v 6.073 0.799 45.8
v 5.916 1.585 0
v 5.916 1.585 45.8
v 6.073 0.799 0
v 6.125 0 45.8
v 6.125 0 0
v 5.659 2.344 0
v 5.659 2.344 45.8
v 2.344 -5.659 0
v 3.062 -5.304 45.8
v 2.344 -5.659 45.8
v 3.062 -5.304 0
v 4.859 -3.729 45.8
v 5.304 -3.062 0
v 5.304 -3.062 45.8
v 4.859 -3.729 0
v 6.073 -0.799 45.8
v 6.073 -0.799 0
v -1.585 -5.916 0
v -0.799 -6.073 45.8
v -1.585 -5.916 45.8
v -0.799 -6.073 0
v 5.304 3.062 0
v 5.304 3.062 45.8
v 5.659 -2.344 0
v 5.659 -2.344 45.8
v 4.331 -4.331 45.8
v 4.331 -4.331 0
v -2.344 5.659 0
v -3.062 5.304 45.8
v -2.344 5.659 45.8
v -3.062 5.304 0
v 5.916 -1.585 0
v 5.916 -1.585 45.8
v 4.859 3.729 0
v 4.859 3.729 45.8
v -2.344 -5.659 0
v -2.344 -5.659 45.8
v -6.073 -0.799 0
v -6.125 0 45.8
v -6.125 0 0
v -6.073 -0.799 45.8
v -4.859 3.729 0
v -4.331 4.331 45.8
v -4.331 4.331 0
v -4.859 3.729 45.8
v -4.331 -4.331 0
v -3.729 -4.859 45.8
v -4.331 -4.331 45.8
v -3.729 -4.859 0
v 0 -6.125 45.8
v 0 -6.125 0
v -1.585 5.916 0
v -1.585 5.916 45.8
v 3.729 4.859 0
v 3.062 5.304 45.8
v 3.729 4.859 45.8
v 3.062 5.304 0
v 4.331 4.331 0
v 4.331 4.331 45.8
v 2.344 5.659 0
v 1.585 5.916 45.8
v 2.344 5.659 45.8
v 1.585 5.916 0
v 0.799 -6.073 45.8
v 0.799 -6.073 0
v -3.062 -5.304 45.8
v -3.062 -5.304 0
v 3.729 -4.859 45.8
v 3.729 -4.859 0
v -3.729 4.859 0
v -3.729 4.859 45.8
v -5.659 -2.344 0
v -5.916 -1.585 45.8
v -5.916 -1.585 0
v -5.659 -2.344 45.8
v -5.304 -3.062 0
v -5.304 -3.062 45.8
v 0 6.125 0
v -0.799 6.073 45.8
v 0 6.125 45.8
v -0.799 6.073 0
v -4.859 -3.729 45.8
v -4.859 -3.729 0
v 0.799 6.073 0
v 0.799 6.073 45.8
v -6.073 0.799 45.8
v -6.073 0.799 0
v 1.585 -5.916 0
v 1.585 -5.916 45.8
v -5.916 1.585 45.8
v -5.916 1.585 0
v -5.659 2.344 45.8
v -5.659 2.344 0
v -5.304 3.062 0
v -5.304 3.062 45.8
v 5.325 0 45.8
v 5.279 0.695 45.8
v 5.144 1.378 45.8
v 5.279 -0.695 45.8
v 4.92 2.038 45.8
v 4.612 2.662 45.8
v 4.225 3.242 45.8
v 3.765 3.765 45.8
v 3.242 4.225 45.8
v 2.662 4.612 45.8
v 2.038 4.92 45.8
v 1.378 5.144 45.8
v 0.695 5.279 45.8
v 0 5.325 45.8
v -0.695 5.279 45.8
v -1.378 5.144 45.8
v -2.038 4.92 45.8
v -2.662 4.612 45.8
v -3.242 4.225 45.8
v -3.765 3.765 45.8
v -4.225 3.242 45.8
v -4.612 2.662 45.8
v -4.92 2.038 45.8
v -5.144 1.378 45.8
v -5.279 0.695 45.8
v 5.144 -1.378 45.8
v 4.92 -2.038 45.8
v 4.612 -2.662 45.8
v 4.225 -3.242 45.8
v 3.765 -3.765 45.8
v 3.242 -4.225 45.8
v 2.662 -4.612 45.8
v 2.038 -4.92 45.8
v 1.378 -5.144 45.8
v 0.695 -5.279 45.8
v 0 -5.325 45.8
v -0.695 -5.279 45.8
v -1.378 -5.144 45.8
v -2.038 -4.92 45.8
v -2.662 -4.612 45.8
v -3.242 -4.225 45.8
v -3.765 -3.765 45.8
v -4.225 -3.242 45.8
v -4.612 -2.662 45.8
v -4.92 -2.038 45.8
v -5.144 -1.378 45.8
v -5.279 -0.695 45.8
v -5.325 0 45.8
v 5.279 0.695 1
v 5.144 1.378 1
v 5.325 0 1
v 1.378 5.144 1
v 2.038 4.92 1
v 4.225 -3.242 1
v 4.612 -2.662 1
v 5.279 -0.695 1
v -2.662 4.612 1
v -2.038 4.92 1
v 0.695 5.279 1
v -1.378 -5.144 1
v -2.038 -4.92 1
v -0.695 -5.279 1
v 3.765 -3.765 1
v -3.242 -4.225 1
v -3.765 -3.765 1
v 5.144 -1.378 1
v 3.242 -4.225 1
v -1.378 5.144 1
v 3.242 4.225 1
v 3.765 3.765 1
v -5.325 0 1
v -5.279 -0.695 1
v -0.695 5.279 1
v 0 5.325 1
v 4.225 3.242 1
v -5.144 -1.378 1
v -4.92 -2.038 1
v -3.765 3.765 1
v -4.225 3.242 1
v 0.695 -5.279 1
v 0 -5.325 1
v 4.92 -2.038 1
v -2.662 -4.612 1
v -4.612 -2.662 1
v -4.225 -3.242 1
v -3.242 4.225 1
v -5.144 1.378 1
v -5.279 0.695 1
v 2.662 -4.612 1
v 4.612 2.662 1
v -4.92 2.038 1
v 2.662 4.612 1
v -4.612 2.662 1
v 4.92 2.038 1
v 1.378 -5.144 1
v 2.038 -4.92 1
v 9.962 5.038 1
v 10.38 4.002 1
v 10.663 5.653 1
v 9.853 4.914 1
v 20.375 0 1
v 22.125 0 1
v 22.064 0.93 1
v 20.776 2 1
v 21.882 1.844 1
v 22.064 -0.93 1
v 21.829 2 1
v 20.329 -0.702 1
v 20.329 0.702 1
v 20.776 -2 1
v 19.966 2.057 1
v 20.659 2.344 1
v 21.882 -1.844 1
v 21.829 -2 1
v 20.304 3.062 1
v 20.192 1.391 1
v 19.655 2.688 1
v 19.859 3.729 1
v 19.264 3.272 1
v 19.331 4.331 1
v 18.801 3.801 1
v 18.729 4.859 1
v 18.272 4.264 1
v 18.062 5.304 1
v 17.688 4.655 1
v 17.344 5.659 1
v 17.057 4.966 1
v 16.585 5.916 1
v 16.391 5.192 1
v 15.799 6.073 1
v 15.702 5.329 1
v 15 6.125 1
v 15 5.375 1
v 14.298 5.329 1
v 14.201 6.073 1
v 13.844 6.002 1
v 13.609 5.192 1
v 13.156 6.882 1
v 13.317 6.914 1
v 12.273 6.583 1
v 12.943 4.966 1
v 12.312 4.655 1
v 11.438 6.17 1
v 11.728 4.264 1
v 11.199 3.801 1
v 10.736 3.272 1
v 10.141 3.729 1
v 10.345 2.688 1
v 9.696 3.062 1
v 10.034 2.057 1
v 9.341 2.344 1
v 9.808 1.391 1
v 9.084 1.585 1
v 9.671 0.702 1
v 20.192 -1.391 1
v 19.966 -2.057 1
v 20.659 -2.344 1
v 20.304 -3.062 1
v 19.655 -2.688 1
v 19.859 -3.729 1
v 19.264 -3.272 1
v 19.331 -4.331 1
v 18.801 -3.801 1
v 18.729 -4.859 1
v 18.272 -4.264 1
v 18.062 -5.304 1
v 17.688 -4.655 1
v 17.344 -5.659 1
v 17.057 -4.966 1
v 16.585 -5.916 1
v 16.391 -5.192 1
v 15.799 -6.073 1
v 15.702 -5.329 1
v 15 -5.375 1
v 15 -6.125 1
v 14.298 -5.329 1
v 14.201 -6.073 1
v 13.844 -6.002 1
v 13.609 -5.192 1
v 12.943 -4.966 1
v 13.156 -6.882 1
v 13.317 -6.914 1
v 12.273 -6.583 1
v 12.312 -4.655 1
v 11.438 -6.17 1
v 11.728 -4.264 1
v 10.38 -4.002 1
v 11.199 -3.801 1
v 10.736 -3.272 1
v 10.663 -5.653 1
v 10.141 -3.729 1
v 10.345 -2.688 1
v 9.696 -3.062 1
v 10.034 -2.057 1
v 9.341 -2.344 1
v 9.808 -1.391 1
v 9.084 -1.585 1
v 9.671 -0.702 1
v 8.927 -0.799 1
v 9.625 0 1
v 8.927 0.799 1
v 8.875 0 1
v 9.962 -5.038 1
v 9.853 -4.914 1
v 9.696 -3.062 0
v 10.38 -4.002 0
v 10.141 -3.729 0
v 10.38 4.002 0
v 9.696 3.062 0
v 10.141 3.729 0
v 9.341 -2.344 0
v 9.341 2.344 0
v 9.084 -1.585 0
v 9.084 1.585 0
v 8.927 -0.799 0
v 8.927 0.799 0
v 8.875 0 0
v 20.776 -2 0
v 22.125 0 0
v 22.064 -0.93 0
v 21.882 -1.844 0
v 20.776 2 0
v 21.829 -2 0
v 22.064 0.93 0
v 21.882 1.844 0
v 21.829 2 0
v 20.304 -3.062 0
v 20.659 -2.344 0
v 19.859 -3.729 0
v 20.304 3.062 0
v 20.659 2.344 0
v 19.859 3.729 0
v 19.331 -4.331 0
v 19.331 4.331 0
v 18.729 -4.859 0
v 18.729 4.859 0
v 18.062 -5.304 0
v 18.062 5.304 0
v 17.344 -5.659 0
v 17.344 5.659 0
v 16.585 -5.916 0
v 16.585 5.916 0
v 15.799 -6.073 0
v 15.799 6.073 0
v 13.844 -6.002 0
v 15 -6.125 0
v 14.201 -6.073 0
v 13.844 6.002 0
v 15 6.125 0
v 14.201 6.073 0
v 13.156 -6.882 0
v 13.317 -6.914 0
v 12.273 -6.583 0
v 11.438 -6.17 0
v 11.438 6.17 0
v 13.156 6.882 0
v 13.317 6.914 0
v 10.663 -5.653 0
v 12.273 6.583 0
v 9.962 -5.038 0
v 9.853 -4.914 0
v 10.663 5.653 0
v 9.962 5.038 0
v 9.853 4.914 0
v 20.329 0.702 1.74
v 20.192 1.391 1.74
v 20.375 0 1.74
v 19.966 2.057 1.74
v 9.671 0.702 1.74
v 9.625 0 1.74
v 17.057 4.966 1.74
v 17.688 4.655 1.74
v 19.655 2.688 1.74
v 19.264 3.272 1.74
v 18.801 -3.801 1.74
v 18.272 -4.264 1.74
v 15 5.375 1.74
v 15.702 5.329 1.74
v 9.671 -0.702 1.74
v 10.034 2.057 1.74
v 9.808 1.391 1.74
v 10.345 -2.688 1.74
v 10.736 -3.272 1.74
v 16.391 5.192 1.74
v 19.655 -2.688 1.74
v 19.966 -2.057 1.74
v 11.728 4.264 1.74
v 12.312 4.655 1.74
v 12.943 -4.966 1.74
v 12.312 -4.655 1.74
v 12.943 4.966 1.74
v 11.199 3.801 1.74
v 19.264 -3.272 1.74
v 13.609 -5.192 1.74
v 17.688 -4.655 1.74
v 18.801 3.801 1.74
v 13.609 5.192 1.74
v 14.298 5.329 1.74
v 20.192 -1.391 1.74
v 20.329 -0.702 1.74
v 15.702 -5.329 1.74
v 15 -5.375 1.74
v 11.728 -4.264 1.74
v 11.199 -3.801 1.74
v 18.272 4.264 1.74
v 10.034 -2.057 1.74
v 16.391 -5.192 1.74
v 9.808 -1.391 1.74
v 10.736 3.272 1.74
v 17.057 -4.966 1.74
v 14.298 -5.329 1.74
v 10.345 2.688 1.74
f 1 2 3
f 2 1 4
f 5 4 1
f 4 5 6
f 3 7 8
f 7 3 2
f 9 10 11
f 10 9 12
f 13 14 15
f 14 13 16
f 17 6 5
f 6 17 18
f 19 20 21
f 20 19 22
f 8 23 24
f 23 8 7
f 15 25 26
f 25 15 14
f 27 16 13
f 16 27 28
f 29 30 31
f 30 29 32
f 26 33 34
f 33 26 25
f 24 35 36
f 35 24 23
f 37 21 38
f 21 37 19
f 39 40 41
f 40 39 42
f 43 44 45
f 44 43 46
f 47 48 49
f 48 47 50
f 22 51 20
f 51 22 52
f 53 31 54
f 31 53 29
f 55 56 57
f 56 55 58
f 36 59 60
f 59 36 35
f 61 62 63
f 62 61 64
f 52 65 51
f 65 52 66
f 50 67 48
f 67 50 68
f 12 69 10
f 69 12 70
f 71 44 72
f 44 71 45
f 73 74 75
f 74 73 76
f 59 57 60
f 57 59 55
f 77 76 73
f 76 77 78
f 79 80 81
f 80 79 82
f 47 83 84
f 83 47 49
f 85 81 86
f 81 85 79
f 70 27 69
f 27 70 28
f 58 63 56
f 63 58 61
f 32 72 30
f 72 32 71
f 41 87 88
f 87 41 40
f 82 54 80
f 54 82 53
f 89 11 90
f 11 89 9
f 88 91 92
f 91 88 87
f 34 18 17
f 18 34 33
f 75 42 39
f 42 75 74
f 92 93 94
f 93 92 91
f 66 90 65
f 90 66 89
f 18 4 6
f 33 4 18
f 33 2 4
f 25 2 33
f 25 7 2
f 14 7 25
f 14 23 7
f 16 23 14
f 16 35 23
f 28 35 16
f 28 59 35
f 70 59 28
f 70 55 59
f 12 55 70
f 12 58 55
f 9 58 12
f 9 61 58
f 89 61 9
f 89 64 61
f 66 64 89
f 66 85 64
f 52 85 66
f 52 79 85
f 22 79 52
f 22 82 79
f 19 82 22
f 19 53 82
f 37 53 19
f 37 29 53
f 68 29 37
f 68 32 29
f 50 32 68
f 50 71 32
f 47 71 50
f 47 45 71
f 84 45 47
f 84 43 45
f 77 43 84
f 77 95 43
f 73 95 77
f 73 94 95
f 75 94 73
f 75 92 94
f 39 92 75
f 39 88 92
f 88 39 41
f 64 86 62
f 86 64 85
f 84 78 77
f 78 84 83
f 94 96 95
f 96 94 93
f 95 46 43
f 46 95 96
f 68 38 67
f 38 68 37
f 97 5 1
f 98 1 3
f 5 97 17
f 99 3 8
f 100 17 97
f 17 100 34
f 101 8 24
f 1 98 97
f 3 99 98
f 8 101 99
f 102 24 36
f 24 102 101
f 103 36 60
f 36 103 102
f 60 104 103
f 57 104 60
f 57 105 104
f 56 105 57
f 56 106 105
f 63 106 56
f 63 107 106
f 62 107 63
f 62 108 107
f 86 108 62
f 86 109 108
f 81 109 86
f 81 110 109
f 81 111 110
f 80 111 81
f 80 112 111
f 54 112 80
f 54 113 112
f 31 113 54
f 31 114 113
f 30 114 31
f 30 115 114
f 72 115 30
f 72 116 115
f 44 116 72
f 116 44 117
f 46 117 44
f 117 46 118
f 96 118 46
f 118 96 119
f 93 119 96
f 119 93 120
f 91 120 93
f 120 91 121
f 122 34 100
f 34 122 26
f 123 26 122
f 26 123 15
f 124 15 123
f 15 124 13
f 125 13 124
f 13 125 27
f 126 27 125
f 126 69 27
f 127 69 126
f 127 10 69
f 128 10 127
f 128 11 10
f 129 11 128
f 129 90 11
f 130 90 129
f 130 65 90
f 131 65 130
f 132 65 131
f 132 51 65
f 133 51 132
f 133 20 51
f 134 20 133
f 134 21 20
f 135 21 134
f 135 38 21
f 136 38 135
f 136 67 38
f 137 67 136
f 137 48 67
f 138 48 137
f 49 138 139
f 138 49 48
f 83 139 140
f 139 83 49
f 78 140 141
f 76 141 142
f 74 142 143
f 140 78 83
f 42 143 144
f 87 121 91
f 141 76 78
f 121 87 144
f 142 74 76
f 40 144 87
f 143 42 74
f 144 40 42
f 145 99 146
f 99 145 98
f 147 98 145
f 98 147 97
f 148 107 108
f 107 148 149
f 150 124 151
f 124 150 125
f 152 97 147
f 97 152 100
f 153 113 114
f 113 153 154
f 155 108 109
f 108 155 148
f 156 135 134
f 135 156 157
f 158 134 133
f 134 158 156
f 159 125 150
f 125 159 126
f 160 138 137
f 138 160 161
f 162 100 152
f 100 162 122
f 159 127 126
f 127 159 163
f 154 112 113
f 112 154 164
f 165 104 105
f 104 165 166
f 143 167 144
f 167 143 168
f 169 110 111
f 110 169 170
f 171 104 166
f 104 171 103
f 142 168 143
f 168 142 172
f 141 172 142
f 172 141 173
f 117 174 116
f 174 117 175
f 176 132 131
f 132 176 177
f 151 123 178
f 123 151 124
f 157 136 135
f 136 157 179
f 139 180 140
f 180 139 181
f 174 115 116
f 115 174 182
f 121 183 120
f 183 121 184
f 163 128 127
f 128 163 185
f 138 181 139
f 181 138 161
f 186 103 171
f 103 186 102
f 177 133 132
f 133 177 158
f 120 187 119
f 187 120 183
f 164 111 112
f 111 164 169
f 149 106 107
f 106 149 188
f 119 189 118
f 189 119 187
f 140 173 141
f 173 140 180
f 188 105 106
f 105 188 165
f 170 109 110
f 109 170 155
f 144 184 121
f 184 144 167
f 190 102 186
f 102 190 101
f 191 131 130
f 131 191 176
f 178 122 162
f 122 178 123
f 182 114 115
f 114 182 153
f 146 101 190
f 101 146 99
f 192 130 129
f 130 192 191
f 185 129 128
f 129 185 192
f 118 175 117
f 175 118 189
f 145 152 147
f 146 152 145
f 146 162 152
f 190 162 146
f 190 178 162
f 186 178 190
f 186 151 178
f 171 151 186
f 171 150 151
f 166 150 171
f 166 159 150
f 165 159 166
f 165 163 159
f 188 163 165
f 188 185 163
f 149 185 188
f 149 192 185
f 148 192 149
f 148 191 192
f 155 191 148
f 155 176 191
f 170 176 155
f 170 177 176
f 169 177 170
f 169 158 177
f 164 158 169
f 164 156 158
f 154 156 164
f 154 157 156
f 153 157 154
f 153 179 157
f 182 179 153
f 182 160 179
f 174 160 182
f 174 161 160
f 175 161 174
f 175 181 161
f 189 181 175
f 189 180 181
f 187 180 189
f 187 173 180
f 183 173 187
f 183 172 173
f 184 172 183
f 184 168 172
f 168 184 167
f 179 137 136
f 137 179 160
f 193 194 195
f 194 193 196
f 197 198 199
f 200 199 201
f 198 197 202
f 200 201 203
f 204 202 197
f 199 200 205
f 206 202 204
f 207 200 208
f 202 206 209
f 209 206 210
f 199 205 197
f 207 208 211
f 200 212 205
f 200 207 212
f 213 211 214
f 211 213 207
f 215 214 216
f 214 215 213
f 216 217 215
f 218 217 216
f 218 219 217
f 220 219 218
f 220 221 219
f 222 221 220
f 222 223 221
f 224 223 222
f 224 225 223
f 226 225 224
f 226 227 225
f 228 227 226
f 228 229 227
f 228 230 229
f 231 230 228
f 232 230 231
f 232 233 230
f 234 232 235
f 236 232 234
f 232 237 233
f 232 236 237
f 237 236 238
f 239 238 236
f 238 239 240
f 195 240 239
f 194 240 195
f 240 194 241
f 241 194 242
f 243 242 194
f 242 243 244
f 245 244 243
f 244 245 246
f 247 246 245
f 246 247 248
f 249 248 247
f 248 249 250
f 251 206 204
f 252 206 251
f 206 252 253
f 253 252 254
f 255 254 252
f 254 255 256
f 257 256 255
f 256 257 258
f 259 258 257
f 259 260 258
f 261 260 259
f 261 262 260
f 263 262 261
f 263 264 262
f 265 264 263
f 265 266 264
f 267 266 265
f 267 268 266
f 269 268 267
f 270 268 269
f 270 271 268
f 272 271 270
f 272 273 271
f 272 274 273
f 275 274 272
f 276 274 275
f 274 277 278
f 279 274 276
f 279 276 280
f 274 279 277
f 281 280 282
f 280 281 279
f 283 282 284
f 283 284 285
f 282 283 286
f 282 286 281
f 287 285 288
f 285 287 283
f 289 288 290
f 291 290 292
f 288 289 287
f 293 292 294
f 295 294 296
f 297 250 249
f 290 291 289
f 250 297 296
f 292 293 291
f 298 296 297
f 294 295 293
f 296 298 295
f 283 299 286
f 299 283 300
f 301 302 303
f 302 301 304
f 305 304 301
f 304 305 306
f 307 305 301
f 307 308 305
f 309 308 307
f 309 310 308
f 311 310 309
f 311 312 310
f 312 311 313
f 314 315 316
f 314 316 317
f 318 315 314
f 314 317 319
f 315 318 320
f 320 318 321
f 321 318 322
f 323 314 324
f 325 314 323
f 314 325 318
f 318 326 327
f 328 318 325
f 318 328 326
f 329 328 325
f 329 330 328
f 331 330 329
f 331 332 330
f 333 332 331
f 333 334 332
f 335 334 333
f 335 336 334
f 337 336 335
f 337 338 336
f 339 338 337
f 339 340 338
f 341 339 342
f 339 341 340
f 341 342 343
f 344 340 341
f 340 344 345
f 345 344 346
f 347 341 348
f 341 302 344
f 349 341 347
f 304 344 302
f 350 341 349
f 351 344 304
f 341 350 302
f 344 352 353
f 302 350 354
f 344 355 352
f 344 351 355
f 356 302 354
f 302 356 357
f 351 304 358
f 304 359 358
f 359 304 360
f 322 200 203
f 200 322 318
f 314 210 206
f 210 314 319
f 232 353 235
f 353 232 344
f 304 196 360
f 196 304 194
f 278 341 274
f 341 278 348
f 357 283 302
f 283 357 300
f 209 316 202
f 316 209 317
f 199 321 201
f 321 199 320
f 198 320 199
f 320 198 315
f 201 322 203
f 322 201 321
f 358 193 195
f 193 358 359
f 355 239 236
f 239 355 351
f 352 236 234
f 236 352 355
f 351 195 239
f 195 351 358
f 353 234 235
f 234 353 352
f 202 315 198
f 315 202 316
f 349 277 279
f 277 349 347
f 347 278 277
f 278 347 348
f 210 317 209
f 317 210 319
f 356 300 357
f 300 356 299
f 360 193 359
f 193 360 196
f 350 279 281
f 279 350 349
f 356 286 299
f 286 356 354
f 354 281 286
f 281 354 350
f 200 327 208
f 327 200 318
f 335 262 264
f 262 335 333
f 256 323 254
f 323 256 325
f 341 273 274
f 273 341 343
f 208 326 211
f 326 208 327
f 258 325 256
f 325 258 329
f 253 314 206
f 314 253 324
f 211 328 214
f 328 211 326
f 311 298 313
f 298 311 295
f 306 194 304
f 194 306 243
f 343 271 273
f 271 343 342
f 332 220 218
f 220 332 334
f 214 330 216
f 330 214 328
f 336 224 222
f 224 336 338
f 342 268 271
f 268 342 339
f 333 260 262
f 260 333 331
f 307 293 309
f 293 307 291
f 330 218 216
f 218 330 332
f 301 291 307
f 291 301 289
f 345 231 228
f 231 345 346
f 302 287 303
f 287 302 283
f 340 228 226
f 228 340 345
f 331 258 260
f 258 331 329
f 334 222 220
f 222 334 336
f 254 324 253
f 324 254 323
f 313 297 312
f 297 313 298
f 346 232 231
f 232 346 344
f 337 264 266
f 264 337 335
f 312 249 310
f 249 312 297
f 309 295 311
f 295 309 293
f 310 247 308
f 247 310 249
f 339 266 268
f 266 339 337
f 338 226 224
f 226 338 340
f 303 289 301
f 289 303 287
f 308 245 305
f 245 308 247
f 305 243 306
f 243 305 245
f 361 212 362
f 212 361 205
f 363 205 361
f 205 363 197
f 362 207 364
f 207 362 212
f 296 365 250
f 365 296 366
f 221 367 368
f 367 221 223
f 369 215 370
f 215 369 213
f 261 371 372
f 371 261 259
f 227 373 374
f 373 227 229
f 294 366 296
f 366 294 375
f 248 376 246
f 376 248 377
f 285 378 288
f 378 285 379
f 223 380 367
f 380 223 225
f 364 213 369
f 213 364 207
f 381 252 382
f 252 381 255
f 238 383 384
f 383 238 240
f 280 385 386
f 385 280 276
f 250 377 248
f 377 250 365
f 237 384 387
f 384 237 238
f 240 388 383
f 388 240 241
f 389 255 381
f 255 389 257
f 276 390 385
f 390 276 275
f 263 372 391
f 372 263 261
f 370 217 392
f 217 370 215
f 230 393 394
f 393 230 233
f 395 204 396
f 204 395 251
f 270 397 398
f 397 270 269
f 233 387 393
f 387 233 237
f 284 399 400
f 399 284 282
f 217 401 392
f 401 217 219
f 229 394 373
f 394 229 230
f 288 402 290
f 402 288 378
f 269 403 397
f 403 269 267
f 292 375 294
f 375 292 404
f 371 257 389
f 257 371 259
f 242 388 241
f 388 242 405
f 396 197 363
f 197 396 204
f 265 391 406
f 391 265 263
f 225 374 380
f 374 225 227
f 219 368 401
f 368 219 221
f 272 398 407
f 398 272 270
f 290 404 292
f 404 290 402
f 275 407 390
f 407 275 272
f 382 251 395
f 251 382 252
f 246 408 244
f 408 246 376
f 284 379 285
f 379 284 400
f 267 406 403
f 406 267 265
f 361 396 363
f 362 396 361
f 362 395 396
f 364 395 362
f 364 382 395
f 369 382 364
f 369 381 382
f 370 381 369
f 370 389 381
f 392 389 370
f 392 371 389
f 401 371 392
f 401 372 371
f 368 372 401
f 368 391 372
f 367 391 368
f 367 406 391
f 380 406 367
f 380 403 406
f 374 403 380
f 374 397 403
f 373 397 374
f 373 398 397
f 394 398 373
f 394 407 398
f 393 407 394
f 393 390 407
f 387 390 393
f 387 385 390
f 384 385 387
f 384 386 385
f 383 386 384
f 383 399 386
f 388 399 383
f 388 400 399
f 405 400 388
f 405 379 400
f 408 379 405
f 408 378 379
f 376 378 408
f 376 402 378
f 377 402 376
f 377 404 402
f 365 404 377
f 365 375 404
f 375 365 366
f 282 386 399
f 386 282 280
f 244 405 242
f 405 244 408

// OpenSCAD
// nalgene_test_tubes.scad

// 5x5 test tube holder:
// 12mm side of square holes (note one corner has a 45 degree diagonal inset)
// 2mm between holes
// 47mm verticxal space inside container

//show_cutaway = true;
show_cutaway = false;

//lid_in_place = true;
lid_in_place = false;

eps = 0.01;

height = 47;
//height = 7;
//height = 15;
diameter = 12.25;

base_thickess = 1;
wall_thickness = 0.4;

res = 48;
gap = 0.2;

// should be <=1 as dist between tube holders in nalgene case is 2mm
lid_pop_tab_size = 1.0;

// not including the inset-fitting part inside the tube
lid_height = 1.0;
lid_snap_bit_height = 0.75;

radius = diameter / 2;

tube_height = height - gap - lid_height;

lid_print_displace = 15;

difference() {
    main(lid_in_place);

    if (show_cutaway) {
        translate([0, -50, -1])
            cube(100, center=true);
        // uncoomment this to get very thin slice
//        translate([0, 50 + 1, -1])
//            cube(100, center=true);
    }
}

module main(fit_in_place=false) {
    // main tube
    difference() {
        cylinder(tube_height, radius, radius, $fn = res);
        translate([0, 0, base_thickess])
            cylinder(tube_height, radius - wall_thickness*2, radius - wall_thickness*2, $fn = res);
    }
    
    
    for (lid_idx = [0 : 0]) {
//        use_gap = 0.02 * lid_idx;
        use_gap = -0.025 + 0.005 * lid_idx;
        
        // lid
        inner_fit_lid_radius = radius - 2*(wall_thickness + use_gap);
        
        x_translate = fit_in_place ? 0 : lid_print_displace * (lid_idx + 1);
        z_translate = fit_in_place ? height : 0;
        z_scale = fit_in_place ? -1 : 1;
        
        translate([x_translate, 0, z_translate]) {
            // lid and snap bit
            scale([1, 1, z_scale]) {
                cylinder(lid_height, radius, radius, $fn = res);
                translate([0, 0, lid_height - eps]) {
                    cylinder(lid_snap_bit_height, inner_fit_lid_radius, inner_fit_lid_radius, $fn = res);            
                }
                // pop lid tabs
                intersection() {
                    cylinder(lid_height, radius + lid_pop_tab_size, radius + lid_pop_tab_size, $fn = res);
                    for (rot = [0 : 120 : 240]) {
                        echo(rot);
                        rotate([0, 0, rot]) {
                            translate([25, 0, lid_height/2])
                                cube([50, 4, lid_height], center=true);
                        }
                    }
                }
            
            }
    //        lid_pop_tab_size
        }
    }
}
